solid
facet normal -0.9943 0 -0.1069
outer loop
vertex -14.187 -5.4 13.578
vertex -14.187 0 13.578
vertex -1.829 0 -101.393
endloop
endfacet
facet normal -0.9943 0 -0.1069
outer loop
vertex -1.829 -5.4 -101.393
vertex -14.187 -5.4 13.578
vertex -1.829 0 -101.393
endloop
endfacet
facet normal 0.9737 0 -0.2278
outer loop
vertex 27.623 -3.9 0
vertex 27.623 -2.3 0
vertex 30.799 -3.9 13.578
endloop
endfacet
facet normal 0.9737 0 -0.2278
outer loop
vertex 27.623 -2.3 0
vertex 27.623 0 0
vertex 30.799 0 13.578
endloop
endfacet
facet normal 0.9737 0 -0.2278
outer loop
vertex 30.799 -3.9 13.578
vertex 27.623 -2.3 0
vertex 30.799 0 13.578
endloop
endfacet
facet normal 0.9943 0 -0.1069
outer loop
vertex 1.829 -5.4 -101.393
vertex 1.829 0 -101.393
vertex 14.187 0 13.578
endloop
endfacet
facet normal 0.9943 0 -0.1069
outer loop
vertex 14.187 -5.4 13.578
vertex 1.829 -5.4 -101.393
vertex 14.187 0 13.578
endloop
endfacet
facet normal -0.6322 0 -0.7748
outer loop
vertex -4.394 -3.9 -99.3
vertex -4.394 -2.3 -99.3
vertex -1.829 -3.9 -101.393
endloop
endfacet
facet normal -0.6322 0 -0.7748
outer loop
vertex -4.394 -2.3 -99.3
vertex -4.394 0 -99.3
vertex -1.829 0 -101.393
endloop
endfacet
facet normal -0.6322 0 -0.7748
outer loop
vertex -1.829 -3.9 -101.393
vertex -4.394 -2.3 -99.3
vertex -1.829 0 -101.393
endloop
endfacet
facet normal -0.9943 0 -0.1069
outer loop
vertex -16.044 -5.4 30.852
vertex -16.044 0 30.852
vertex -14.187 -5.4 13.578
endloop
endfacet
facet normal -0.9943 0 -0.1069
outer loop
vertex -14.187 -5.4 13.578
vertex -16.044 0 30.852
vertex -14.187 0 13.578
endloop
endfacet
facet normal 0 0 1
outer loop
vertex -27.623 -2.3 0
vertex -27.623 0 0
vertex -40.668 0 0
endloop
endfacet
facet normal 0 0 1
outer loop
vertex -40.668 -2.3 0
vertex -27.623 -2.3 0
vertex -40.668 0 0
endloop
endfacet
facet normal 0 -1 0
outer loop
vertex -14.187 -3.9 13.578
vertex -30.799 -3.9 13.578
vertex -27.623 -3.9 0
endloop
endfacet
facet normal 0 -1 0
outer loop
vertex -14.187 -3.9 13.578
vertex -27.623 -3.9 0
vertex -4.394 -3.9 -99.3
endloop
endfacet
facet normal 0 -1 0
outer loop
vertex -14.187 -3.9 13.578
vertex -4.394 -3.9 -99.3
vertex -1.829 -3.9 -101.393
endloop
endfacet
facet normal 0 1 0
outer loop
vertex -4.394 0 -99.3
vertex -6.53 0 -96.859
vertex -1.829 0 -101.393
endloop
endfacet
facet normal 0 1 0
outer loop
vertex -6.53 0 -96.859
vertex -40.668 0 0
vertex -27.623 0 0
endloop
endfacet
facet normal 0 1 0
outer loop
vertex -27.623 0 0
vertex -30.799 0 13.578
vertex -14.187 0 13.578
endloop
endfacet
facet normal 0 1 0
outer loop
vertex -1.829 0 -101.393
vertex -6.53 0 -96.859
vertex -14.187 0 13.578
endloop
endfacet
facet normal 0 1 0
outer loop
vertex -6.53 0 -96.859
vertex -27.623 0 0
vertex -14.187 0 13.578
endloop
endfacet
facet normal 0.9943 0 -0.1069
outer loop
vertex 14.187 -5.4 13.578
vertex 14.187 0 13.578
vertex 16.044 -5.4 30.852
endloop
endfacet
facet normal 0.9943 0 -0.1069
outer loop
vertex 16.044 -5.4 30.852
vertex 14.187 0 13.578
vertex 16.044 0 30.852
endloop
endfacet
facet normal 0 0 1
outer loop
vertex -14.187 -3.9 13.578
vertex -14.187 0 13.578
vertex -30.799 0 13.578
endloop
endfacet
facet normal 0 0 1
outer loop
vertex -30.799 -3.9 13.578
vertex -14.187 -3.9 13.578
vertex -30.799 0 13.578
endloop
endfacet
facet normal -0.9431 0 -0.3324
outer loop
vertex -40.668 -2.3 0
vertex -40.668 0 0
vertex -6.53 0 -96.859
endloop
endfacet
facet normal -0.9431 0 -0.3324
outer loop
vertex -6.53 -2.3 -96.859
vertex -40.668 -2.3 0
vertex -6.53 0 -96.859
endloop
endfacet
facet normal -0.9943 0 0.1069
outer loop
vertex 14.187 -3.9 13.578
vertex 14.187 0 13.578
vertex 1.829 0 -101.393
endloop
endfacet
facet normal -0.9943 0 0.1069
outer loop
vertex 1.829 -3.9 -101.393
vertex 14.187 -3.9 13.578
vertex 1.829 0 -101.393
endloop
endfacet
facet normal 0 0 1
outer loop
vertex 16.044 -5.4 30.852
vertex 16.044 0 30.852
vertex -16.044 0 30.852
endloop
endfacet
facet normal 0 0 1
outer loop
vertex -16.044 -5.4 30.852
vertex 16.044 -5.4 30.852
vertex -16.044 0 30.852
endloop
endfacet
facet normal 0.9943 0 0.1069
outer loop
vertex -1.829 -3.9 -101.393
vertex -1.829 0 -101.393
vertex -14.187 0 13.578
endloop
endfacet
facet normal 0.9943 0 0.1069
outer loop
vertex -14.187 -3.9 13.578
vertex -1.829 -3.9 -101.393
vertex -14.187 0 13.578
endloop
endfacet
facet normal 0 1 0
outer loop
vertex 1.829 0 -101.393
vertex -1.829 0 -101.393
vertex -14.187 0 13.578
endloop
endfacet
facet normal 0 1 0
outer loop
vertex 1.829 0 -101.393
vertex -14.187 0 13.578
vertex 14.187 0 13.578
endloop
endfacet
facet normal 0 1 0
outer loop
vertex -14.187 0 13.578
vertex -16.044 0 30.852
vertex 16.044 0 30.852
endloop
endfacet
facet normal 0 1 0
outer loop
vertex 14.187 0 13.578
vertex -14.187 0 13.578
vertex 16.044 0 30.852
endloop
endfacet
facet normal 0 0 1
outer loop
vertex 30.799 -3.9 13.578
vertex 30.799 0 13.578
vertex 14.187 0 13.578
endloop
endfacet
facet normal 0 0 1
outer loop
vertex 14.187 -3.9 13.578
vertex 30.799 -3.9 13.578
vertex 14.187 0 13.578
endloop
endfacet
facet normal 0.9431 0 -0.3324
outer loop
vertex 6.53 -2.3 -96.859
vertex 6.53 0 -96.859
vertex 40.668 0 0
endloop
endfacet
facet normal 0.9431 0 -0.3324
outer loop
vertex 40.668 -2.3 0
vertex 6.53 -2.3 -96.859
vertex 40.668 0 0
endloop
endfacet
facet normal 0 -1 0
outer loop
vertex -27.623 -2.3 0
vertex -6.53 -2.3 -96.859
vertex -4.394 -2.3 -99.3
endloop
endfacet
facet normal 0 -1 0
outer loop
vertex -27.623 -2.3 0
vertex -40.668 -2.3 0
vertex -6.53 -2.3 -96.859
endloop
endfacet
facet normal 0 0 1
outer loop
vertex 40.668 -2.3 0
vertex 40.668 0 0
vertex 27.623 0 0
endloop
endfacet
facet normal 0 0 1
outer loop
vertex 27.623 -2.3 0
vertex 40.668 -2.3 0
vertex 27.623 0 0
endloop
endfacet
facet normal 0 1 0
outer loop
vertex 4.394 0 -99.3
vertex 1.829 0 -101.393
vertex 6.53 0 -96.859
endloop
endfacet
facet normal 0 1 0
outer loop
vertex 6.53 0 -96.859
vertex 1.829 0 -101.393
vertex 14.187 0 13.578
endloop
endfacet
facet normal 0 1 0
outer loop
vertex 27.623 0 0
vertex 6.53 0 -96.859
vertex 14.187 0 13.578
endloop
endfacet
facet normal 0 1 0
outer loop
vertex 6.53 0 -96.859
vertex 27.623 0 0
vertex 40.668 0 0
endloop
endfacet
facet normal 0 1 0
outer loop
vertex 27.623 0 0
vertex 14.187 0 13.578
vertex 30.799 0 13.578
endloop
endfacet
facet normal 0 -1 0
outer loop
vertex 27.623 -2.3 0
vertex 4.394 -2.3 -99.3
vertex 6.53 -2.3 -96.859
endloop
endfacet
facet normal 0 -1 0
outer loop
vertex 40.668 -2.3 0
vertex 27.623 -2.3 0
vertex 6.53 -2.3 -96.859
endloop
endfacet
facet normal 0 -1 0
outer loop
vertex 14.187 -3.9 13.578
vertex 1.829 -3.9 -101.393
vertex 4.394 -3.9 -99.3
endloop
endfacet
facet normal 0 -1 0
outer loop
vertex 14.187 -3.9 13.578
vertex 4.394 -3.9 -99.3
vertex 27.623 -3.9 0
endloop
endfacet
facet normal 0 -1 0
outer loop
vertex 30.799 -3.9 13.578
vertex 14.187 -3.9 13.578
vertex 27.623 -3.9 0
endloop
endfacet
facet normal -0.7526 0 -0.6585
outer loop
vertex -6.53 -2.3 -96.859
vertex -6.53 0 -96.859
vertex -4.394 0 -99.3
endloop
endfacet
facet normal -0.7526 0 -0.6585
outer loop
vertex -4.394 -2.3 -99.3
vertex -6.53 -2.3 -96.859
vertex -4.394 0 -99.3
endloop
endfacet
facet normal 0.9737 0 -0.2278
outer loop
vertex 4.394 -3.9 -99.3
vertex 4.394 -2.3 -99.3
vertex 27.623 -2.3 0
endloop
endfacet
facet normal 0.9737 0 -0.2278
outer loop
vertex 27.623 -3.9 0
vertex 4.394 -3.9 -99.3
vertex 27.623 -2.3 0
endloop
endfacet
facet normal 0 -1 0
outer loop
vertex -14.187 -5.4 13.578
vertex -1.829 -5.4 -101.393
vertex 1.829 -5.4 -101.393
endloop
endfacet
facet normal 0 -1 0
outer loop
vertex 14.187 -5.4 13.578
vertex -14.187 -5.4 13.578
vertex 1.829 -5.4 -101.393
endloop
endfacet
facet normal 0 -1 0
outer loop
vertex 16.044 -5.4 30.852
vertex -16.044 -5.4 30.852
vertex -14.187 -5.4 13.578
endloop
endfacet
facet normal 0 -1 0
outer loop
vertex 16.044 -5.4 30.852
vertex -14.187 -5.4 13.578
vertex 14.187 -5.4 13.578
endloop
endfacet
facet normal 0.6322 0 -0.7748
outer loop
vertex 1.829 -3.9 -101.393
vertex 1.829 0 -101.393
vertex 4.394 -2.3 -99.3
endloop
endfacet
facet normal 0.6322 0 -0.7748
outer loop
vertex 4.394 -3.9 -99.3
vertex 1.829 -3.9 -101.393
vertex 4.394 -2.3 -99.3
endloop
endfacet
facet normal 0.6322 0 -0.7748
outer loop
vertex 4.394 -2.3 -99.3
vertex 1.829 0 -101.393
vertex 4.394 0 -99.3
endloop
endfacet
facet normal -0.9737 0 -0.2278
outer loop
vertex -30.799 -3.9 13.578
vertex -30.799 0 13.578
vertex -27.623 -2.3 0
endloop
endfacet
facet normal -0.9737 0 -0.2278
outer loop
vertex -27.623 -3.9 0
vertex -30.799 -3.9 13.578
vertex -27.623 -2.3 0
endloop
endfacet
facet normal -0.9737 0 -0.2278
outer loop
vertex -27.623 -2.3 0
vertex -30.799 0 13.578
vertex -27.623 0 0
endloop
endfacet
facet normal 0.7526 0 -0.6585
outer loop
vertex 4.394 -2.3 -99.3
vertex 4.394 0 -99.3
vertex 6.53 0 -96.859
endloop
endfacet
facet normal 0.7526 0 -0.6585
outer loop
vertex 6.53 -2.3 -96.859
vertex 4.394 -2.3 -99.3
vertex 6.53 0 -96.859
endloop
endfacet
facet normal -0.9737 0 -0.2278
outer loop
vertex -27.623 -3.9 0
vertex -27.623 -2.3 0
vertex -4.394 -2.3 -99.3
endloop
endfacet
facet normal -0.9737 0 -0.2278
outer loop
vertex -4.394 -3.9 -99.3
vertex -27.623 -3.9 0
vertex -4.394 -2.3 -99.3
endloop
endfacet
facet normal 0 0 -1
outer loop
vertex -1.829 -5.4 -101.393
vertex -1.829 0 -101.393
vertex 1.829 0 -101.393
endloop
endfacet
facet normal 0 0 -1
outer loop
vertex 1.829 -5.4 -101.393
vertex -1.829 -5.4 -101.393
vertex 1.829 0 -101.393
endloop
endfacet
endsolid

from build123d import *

# Parameters (mm, degrees)
F1_DEPTH = 5.4
F2_DEPTH = 3.9
F3_DEPTH = 3.9
F4_DEPTH = 2.3
F5_DEPTH = 2.3


with BuildPart() as f1:
    # F0 (on Front) → F1 (new body)
    with BuildSketch(Plane.XZ):
        Polygon((16.044244, 30.851798), (-16.044244, 30.851798), (-14.187476, 13.577953), (-1.829188, -101.393424), (1.829188, -101.393424), (14.187476, 13.577953), align=None)
    extrude(amount=F1_DEPTH)


with BuildPart() as f2:
    # F0 (on Front) → F2 (new body)
    with BuildSketch(Plane.XZ):
        Polygon((-1.829188, -101.393424), (-14.187476, 13.577953), (-30.799333, 13.577953), (-27.623073, 0), (-4.393942, -99.300437), align=None)
    extrude(amount=F2_DEPTH)

    # F0 (on Front) → F4 (join)
    with BuildSketch(Plane.XZ):
        Polygon((-6.529819, -96.859433), (-4.393942, -99.300437), (-27.623073, 0), (-40.667627, 0), align=None)
    extrude(amount=F4_DEPTH)


with BuildPart() as f3:
    # F0 (on Front) → F3 (new body)
    with BuildSketch(Plane.XZ):
        Polygon((30.799333, 13.577953), (14.187476, 13.577953), (1.829188, -101.393424), (4.393942, -99.300437), (27.623073, 0), align=None)
    extrude(amount=F3_DEPTH)

    # F0 (on Front) → F5 (join)
    with BuildSketch(Plane.XZ):
        Polygon((27.623073, 0), (4.393942, -99.300437), (6.529819, -96.859433), (40.667627, 0), align=None)
    extrude(amount=F5_DEPTH)


solid = Compound([f1.part, f2.part, f3.part])
